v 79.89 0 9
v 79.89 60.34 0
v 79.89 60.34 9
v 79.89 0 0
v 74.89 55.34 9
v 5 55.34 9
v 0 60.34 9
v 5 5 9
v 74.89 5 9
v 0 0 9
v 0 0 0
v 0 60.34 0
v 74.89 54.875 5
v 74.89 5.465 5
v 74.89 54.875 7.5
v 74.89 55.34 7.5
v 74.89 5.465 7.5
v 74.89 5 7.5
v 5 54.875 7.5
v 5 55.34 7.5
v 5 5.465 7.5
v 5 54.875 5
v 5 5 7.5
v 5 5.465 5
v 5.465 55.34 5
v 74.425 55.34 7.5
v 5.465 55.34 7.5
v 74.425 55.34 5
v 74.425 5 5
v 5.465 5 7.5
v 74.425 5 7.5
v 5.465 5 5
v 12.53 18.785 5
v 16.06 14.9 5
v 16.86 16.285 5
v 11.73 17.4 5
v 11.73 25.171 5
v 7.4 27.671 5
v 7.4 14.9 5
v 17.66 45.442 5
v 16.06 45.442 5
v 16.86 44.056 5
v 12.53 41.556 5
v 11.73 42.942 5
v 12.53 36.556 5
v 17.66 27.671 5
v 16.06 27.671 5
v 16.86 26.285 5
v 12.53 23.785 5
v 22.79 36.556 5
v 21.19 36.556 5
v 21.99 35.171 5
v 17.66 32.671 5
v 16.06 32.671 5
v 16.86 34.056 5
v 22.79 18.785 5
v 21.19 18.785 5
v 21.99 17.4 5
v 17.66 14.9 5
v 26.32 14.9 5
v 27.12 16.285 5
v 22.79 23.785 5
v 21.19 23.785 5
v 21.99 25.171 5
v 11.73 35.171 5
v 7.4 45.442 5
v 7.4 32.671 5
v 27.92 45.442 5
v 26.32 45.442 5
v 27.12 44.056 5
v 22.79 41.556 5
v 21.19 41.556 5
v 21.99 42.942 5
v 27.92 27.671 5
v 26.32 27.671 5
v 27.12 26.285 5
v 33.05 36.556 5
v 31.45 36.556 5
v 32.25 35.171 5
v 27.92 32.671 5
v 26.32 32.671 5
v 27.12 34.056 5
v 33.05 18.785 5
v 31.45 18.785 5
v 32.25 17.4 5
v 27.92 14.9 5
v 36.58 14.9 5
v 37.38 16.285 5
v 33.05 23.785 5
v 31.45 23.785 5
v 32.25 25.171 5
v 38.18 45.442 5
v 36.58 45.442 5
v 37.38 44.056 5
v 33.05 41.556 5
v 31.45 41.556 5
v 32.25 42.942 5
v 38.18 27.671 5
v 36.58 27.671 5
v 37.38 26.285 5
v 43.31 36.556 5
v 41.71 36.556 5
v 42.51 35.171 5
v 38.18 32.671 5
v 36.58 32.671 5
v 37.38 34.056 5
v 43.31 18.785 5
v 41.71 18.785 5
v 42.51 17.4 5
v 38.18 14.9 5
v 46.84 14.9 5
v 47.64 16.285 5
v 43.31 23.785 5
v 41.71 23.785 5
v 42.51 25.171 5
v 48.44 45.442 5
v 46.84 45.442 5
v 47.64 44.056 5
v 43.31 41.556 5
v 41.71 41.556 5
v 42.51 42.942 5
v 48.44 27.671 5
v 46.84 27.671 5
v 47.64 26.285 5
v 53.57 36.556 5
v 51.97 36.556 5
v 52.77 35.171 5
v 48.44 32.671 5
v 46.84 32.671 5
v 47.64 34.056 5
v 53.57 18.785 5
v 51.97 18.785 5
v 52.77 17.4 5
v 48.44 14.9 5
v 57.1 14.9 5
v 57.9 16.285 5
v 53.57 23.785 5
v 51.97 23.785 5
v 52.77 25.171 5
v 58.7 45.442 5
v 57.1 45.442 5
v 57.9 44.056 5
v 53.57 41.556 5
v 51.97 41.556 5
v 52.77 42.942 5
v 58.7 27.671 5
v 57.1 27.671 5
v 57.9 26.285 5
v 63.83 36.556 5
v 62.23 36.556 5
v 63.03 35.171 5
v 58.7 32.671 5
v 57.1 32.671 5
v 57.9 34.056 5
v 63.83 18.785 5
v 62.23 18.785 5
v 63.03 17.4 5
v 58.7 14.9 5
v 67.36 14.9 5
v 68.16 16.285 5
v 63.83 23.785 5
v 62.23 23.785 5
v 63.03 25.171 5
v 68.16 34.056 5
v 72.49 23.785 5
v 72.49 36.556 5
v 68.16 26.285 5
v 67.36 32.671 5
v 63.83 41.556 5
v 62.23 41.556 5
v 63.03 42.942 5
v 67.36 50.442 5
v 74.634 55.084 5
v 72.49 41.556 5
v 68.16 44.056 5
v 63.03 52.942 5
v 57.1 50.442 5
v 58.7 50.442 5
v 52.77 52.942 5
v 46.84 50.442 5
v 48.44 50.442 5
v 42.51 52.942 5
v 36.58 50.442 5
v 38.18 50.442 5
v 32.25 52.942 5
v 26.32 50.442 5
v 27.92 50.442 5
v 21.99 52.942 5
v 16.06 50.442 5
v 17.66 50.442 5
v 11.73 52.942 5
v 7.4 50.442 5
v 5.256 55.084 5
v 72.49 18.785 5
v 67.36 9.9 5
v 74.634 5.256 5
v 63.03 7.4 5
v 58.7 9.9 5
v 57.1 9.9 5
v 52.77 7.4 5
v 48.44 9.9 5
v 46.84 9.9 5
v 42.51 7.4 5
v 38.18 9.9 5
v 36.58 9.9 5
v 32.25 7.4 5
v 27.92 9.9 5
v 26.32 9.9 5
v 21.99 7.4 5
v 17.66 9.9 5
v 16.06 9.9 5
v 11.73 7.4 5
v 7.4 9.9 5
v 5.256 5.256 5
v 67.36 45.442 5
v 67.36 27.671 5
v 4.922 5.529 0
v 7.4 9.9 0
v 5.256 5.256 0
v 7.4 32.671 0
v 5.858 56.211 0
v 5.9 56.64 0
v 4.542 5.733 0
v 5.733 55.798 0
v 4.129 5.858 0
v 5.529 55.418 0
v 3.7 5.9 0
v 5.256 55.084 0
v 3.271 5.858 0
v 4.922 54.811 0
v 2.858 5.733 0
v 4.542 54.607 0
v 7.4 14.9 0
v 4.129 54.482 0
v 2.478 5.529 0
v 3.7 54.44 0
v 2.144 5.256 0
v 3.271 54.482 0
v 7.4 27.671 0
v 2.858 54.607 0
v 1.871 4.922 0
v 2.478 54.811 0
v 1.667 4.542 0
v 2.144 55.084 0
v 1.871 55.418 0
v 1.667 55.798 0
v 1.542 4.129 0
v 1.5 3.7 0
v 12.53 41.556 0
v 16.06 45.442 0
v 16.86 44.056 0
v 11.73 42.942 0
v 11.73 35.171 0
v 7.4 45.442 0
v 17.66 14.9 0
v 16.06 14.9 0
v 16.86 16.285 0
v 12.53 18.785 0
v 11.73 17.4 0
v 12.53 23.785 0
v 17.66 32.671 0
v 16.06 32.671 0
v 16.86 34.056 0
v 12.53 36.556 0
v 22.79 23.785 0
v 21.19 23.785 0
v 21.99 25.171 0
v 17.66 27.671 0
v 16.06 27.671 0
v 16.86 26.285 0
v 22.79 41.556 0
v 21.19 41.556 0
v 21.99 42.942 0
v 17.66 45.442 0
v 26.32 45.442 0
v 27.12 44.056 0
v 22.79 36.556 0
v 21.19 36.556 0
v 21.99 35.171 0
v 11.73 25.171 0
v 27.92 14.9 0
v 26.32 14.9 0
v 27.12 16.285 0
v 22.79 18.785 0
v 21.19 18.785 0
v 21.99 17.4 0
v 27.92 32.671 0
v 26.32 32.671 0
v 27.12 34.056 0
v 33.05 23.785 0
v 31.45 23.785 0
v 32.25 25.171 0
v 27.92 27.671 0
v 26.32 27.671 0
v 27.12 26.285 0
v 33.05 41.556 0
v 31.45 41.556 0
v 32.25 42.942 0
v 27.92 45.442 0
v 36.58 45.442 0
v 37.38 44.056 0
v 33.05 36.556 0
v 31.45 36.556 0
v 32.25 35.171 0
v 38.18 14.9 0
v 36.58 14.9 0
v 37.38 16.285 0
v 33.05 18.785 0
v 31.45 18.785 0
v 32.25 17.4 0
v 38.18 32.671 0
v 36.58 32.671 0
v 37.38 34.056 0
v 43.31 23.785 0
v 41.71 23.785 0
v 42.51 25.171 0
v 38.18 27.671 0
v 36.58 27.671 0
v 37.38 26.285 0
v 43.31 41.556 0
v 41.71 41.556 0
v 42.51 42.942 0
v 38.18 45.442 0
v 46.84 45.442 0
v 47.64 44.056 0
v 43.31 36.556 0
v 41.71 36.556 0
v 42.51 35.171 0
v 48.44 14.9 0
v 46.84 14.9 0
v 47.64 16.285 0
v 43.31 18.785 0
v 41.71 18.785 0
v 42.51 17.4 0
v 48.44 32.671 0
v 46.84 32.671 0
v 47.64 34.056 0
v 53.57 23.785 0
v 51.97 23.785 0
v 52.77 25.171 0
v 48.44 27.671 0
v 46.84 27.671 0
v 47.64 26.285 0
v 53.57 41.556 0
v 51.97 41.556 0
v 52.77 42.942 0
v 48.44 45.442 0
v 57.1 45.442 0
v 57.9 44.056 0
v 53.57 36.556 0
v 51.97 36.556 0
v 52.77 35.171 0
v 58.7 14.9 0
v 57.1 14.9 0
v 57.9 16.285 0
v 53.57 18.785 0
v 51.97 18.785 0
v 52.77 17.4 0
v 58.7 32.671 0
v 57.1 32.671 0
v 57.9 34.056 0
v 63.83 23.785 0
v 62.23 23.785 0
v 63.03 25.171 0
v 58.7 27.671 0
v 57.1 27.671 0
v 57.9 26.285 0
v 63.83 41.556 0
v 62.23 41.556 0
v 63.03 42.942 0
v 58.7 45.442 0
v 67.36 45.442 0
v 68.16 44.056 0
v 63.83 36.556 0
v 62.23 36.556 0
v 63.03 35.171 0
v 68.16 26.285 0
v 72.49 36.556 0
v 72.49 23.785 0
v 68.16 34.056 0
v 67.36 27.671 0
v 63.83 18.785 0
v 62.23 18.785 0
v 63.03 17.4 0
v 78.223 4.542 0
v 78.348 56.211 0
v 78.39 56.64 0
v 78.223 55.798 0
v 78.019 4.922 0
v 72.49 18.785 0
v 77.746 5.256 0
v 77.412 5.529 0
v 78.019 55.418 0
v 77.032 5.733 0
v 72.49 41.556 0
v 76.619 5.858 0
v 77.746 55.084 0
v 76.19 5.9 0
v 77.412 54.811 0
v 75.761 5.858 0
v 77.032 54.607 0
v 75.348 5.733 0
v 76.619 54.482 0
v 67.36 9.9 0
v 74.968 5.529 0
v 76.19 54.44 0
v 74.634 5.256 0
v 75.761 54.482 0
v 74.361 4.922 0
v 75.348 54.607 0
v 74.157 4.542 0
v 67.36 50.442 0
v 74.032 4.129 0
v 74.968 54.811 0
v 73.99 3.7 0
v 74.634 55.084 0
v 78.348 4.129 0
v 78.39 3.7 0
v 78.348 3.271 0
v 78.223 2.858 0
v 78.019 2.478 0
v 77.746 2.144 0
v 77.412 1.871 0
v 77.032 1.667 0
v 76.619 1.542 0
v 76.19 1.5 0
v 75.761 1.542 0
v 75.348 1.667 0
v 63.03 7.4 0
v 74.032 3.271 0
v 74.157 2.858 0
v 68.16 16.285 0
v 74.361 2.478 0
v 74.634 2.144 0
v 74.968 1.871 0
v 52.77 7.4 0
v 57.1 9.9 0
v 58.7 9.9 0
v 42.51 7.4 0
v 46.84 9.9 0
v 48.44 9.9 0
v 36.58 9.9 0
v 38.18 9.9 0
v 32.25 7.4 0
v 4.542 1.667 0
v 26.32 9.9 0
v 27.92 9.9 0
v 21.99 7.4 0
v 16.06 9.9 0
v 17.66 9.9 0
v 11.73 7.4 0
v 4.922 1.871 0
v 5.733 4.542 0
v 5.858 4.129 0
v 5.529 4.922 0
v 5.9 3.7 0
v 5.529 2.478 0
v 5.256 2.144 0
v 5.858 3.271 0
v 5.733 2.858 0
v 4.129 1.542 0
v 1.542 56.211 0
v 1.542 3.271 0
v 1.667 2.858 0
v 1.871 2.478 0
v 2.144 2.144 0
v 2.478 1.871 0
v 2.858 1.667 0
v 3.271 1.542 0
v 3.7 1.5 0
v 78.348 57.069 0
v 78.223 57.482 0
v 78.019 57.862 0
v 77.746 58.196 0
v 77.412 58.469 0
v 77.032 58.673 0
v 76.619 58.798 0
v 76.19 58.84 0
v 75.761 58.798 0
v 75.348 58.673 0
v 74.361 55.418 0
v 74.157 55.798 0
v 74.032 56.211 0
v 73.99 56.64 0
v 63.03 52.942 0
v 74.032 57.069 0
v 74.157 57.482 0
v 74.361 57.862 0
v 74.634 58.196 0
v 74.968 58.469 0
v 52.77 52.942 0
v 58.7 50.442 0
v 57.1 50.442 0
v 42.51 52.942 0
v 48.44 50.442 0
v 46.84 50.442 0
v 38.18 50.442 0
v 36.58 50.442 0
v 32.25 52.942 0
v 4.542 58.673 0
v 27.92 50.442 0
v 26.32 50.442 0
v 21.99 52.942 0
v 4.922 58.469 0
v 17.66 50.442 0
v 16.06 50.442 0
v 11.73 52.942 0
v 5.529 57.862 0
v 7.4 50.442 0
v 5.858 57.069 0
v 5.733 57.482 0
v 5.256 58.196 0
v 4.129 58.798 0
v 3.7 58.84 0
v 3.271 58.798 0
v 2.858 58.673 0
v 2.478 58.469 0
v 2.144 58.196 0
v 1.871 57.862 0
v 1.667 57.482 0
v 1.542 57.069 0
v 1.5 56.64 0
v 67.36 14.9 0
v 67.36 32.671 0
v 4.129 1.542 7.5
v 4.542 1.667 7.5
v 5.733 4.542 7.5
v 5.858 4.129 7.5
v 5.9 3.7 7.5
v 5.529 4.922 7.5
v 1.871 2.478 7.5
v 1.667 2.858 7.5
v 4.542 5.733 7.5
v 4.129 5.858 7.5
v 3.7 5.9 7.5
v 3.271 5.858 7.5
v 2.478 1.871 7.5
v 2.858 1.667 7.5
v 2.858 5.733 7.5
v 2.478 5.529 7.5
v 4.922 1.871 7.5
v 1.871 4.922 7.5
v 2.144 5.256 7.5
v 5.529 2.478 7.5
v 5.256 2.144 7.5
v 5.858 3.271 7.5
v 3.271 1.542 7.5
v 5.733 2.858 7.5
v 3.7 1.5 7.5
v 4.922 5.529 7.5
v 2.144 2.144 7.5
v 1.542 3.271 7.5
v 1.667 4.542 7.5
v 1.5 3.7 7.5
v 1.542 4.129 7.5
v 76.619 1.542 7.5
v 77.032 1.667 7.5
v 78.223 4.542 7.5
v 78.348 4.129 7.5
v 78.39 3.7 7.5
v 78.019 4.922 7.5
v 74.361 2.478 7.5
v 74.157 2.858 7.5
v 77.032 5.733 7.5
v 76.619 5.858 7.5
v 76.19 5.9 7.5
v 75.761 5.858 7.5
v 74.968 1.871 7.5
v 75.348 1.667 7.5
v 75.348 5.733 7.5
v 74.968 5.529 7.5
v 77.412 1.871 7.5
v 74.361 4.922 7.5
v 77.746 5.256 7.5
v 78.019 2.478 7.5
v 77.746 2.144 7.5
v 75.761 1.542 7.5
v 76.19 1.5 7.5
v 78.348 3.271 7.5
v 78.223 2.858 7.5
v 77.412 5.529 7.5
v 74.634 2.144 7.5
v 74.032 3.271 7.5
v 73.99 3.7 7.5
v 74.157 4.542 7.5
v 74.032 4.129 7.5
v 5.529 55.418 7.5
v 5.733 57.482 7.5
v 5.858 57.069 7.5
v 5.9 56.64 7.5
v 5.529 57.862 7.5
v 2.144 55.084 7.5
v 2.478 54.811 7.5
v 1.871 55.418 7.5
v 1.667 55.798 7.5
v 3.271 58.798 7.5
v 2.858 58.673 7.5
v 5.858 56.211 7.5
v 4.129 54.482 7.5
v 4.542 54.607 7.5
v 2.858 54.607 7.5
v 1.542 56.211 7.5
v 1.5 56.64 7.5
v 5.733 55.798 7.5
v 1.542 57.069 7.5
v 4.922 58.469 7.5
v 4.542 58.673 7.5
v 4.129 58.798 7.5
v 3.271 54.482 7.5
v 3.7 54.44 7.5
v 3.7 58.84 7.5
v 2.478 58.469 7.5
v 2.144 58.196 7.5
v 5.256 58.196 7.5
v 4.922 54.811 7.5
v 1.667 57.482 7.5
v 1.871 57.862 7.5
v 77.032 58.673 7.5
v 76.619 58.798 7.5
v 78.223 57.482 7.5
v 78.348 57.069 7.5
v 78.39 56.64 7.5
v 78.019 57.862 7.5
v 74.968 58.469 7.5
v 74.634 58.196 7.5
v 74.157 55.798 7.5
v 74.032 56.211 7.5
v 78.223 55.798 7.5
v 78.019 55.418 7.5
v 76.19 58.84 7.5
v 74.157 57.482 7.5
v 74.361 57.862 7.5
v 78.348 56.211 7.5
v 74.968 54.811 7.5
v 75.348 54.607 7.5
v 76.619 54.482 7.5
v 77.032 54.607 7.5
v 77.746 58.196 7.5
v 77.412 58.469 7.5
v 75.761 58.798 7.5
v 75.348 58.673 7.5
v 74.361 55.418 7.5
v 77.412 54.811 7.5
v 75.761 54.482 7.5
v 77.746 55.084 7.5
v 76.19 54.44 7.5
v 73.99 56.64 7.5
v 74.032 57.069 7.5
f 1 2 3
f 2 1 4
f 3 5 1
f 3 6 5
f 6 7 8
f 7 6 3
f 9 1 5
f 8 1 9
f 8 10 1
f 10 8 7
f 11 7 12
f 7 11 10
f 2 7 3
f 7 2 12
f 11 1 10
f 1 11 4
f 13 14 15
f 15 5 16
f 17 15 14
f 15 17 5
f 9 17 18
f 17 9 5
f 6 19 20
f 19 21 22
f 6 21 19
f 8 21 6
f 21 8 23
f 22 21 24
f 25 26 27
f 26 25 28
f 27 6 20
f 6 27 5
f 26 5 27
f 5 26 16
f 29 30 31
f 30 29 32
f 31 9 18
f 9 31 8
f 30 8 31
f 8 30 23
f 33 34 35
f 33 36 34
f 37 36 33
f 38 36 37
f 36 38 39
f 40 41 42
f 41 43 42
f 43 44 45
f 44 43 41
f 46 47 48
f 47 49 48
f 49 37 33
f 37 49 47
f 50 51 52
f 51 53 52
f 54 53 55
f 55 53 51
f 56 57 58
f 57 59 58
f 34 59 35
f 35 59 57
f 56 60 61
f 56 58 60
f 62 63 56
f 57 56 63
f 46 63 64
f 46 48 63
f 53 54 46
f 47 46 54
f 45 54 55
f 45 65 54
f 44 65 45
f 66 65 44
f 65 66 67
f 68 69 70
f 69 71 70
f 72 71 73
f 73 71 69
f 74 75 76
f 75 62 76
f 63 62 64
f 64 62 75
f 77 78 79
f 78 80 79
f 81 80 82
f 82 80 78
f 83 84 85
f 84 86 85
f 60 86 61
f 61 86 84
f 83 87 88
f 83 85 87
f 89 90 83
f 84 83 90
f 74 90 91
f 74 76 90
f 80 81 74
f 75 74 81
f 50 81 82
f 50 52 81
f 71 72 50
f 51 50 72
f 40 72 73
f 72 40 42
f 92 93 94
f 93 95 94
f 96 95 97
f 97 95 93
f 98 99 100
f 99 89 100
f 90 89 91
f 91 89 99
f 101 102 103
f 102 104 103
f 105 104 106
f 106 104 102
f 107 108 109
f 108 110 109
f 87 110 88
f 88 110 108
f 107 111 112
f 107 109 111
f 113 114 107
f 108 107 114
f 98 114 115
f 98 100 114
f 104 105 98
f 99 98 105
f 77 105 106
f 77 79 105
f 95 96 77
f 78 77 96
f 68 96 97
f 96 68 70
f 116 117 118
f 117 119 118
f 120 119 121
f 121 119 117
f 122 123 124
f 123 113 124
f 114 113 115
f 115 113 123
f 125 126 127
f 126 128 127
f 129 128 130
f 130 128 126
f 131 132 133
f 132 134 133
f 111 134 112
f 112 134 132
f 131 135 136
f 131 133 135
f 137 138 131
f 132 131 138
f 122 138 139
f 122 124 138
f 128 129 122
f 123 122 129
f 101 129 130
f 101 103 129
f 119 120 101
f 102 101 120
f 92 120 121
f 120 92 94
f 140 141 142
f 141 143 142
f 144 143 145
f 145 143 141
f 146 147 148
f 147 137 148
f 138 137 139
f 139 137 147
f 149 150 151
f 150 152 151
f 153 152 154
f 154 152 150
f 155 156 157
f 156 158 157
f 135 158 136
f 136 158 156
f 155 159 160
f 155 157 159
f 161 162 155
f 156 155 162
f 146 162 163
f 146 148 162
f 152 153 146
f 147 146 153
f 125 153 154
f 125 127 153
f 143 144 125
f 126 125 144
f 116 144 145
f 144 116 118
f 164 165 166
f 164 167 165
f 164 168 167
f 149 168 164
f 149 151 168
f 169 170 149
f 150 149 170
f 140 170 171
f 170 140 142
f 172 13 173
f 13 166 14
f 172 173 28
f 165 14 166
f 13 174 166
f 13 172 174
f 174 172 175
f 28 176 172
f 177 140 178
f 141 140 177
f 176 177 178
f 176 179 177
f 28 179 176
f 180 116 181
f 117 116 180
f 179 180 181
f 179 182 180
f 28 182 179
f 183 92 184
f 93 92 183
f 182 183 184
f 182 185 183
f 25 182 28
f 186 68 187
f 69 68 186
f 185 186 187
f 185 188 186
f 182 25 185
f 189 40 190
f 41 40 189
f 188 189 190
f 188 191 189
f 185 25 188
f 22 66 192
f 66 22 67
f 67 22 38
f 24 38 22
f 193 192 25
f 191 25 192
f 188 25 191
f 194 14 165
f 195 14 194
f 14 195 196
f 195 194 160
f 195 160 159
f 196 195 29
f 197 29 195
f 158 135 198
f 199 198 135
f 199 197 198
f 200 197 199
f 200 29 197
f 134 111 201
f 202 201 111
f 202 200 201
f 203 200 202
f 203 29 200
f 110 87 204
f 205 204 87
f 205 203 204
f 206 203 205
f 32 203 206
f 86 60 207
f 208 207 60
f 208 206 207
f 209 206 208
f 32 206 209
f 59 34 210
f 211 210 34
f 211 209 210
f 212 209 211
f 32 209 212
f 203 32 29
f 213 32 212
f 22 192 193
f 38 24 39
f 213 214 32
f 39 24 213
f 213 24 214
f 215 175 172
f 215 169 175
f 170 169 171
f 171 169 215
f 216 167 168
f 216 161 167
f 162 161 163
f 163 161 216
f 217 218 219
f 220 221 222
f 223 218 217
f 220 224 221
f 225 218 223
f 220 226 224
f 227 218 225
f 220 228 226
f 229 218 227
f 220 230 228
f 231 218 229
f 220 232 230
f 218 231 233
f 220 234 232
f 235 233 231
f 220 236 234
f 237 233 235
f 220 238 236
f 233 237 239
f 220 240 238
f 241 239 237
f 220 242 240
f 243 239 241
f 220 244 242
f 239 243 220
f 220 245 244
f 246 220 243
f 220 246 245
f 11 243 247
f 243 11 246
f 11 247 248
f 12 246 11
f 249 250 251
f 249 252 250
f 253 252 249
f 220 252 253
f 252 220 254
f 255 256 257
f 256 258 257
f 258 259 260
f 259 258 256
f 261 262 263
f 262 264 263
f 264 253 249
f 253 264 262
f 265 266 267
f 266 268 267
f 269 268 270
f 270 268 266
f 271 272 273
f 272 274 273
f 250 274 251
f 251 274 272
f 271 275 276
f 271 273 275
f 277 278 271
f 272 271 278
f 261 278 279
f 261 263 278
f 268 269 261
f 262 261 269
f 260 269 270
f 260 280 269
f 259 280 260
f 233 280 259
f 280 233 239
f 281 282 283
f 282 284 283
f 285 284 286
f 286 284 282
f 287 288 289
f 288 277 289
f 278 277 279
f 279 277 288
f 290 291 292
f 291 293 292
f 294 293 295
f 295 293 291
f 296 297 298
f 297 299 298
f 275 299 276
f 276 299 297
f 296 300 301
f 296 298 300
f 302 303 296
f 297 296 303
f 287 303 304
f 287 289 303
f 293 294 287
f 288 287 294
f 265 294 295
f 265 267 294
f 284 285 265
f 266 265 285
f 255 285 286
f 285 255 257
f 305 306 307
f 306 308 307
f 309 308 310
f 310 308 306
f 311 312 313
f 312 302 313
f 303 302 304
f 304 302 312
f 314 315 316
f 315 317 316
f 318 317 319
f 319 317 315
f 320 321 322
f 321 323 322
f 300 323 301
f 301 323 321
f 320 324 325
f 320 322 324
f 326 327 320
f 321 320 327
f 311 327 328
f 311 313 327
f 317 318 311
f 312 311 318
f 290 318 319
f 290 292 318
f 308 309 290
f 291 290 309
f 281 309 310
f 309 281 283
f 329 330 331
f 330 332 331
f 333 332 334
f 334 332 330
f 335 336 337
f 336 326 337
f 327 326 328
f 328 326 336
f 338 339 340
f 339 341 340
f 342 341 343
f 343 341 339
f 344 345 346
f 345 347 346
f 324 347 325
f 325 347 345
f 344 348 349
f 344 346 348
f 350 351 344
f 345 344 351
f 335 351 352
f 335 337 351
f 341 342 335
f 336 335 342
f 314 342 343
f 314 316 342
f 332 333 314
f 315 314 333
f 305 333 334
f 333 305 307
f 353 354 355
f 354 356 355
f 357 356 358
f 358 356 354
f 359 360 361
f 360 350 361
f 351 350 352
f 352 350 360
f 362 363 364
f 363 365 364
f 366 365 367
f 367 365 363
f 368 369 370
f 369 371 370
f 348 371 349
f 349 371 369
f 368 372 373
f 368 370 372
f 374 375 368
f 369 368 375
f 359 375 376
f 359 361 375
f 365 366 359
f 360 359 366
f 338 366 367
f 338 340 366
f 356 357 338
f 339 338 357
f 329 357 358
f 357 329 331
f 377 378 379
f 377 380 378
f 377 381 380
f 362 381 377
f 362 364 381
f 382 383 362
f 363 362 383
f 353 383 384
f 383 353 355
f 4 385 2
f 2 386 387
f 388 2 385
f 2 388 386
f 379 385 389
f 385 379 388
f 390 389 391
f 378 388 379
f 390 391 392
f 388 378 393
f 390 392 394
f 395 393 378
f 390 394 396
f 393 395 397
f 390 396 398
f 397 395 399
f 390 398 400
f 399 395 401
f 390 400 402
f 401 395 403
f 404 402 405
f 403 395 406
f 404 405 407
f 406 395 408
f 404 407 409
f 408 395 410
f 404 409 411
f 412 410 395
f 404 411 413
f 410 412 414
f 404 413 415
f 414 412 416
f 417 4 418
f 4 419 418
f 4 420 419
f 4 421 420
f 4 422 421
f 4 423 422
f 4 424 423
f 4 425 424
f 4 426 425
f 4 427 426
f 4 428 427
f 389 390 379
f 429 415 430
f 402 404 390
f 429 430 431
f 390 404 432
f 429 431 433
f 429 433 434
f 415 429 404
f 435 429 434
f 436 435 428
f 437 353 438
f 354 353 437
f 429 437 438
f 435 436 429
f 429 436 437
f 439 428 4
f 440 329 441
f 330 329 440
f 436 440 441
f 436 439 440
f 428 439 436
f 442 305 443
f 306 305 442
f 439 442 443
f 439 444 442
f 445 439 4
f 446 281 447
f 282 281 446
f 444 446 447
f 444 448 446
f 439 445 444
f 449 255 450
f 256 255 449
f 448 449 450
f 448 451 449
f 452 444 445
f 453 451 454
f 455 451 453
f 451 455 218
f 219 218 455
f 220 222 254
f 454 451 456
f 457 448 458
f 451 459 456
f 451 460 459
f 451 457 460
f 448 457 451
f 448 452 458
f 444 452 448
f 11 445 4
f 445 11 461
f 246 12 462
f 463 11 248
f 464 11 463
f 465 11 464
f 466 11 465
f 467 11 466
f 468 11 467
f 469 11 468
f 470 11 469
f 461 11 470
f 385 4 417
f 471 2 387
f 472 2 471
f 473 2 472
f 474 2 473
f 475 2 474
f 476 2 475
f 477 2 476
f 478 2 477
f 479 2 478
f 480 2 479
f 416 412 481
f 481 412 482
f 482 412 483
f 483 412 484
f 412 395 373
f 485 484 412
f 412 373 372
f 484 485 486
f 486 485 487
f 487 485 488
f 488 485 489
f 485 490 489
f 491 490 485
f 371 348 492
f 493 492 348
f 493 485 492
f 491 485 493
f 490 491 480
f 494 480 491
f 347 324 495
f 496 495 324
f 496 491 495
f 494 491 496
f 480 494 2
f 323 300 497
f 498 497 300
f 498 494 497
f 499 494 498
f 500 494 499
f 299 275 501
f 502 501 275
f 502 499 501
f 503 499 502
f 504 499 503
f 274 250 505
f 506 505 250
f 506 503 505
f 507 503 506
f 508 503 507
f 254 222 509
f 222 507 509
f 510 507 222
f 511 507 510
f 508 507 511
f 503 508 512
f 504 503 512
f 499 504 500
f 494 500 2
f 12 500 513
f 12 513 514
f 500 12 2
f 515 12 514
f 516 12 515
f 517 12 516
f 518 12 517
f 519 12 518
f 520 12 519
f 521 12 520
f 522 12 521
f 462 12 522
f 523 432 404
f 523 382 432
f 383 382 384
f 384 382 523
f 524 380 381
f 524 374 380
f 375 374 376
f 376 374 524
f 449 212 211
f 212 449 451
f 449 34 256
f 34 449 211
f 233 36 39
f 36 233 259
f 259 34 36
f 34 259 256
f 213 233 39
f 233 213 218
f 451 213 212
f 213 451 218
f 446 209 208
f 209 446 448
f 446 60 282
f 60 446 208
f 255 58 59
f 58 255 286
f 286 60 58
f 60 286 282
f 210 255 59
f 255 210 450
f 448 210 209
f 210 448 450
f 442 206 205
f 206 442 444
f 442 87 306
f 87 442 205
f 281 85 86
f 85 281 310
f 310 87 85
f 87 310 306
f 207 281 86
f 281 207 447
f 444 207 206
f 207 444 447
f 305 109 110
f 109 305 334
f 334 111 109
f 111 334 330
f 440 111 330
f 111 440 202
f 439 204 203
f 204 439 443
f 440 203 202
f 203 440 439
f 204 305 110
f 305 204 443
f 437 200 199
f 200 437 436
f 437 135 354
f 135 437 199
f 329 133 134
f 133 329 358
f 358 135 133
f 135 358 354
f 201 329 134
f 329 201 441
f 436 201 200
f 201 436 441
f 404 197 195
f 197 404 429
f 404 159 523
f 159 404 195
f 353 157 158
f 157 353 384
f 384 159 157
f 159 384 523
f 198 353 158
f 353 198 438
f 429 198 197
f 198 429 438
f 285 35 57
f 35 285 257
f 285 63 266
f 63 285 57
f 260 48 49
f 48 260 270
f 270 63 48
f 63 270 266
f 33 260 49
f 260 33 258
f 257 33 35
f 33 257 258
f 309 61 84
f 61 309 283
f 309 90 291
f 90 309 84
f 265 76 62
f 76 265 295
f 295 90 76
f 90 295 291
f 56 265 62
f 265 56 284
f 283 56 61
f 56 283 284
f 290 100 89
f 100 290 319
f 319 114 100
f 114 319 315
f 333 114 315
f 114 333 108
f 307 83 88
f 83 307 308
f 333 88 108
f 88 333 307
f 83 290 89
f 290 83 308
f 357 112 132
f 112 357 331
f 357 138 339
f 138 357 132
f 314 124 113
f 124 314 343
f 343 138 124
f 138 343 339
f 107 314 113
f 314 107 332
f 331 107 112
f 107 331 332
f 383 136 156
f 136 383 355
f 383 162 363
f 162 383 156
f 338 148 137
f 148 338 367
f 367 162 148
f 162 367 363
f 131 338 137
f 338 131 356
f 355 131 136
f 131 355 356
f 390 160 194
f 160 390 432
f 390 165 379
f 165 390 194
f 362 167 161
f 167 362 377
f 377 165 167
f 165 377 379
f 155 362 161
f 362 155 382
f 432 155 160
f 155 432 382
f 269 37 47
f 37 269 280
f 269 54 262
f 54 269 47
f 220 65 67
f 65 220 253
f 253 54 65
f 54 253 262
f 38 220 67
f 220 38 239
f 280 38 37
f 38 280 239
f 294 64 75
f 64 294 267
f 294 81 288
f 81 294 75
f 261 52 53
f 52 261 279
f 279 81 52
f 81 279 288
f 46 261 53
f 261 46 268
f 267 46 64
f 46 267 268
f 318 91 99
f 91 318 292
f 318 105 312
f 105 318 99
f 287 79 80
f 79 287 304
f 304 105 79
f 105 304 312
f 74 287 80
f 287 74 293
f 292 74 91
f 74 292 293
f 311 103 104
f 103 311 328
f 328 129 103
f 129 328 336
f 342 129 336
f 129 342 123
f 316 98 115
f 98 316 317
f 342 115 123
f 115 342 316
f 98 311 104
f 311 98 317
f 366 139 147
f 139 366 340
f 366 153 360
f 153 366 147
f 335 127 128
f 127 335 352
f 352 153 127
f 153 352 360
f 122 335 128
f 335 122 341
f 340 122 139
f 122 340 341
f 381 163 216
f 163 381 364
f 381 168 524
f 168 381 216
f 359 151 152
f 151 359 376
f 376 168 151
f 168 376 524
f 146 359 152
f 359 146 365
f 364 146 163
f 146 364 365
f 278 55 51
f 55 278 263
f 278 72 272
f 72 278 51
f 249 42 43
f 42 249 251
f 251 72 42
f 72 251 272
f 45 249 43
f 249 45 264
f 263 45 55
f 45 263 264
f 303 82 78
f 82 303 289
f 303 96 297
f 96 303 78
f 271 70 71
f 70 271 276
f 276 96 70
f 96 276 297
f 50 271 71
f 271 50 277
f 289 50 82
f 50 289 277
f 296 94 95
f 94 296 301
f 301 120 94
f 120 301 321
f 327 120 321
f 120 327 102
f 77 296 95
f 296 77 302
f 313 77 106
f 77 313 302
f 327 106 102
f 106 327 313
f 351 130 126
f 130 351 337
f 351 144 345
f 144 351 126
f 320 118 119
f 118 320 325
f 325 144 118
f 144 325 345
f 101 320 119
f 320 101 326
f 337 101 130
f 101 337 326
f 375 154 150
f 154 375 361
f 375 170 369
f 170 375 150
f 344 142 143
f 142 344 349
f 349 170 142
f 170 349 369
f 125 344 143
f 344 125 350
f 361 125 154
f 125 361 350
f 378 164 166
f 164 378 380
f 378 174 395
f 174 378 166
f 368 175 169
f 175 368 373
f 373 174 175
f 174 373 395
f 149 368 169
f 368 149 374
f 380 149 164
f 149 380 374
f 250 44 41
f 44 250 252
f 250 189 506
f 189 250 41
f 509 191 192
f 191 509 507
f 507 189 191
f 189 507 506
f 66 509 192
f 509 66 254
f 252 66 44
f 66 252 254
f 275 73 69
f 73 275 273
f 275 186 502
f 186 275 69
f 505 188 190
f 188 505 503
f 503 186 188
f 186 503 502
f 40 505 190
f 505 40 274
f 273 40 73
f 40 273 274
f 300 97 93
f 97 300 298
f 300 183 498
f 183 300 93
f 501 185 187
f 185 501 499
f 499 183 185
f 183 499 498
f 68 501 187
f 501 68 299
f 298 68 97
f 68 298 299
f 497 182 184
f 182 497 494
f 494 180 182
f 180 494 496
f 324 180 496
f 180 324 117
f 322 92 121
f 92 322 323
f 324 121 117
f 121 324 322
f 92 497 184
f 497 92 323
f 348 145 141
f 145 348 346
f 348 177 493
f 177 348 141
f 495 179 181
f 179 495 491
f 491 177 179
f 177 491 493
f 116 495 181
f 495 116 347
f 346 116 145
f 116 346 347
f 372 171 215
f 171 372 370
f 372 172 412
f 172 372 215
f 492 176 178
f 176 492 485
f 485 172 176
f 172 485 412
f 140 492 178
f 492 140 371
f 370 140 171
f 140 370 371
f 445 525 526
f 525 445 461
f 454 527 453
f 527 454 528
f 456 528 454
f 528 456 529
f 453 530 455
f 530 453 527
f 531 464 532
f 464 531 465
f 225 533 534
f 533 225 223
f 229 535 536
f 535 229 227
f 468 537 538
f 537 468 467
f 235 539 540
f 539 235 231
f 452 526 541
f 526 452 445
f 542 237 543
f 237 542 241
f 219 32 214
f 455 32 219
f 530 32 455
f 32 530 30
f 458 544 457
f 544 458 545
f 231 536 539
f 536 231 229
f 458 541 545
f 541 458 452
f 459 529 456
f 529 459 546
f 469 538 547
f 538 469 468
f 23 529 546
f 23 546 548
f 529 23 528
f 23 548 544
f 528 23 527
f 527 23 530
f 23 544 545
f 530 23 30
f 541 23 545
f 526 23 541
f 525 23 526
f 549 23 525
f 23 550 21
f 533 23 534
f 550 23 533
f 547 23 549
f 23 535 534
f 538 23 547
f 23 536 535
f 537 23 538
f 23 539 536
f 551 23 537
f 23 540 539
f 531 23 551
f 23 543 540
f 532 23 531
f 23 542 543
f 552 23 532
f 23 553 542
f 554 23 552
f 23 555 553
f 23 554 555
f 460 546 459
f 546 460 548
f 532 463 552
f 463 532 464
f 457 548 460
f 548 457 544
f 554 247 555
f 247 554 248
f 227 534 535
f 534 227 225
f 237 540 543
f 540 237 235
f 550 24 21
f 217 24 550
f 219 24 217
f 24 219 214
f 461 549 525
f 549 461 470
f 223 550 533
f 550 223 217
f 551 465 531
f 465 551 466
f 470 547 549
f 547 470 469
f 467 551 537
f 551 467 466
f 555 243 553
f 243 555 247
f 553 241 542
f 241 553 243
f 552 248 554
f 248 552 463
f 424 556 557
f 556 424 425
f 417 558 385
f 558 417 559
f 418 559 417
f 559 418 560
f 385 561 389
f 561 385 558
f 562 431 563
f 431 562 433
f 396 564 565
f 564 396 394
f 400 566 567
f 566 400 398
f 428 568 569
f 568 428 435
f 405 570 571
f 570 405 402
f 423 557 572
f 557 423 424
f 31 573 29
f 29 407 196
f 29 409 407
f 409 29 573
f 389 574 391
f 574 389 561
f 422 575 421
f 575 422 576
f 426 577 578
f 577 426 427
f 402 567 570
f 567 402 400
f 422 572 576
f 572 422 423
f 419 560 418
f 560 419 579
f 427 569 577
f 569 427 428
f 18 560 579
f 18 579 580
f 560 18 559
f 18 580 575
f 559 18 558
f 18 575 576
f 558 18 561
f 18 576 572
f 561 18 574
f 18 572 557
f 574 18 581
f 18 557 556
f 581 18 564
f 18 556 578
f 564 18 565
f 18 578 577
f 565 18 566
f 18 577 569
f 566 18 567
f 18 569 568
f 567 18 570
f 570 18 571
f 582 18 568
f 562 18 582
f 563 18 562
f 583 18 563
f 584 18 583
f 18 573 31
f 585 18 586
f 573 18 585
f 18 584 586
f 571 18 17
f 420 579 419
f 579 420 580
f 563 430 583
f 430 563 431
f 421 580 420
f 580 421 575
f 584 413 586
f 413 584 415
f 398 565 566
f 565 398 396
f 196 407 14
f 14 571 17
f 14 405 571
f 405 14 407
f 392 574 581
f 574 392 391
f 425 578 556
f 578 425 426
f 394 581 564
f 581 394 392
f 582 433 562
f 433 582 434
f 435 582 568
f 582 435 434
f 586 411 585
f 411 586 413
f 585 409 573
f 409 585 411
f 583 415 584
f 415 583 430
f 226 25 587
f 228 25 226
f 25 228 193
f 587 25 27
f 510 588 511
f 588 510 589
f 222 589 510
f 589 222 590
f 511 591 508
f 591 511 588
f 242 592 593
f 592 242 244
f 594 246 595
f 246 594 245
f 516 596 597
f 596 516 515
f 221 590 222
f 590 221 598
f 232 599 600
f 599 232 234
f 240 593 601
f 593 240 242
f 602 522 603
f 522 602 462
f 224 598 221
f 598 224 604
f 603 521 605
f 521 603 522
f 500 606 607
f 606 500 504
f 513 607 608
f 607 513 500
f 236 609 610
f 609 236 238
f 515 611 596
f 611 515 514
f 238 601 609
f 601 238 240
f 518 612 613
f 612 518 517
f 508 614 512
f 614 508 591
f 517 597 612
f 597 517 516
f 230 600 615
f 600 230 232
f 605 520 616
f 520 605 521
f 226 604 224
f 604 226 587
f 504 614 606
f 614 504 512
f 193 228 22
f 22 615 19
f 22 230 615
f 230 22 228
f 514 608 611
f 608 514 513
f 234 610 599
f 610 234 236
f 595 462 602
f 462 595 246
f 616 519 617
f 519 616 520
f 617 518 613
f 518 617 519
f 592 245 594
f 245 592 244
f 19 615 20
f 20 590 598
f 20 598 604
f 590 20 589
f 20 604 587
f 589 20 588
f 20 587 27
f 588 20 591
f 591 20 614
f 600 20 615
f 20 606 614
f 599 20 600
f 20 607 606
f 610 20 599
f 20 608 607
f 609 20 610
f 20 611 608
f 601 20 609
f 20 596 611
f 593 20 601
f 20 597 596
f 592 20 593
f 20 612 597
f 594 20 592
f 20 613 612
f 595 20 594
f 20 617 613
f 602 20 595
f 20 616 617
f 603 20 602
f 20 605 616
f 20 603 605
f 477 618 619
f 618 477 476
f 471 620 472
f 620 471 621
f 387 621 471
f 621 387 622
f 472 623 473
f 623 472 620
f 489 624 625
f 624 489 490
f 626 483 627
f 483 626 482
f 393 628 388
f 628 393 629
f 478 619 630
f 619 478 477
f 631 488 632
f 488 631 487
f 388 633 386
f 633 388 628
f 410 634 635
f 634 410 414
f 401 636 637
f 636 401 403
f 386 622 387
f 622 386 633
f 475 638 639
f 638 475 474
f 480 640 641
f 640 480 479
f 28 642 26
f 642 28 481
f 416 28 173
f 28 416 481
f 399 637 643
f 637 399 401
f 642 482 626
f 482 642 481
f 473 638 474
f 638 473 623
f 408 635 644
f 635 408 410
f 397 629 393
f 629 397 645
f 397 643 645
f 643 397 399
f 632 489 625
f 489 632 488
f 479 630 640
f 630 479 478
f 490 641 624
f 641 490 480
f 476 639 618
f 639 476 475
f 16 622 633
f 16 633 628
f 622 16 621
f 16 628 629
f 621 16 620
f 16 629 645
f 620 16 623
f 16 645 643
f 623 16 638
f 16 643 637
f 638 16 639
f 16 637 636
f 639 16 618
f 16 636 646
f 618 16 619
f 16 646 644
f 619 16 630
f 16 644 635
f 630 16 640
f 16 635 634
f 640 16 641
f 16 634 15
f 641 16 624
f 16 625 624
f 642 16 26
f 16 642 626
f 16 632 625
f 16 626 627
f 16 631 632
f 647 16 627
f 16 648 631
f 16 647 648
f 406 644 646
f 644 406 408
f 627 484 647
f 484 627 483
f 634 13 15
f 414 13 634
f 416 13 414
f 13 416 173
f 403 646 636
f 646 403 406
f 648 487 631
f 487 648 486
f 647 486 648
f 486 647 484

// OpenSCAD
$fn = 32;

// ----------------------------------------------------------------------
// Honeycomb panel: 79.89 x 60.34 mm, 30 cells of 10 mm
// ----------------------------------------------------------------------

// --- parameters (mm) ---
panel_w = 79.89;          // panel width
panel_d = 60.34;          // panel depth
thick = 5;                // panel thickness
cell_r = 5;               // hex cell circumradius
pitch = 10.26;            // hex cell pitch (centre to centre)
web = 1.6;                // web between the cells
columns = 6;              // columns of cells
rows = 5;                 // rows of cells
cell_count = 30;          // total cells
shift_x = 11.73;          // first cell offset in x
shift_y = 12.4;           // first cell offset in y
mount_d = 4.4;            // corner mounting holes
hole_off = 3.7;           // mounting hole offset from the corners
rim_h = 9;                // rim height
rim_t = 5;                // rim wall thickness

difference() {
  union() {
    cube([panel_w, panel_d, thick]);
    /* rim around the panel, sunk 1 mm into the plate */
    translate([0, 0, thick - 1]) difference() {
      cube([panel_w, panel_d, rim_h - thick + 1]);
      translate([rim_t, rim_t, -2.5]) cube([panel_w - 2 * rim_t, panel_d - 2 * rim_t, rim_h - thick + 6]);
    }
  }
  /* hexagonal cells, point-up, cut right through the plate */
  for (row = [0 : rows - 1]) {
    for (col = [0 : columns - 1]) {
      translate([shift_x + col * pitch + (row % 2) * pitch / 2, shift_y + row * pitch * 0.866025, -2.5]) rotate([0, 0, 30]) cylinder(h = thick + 5, d = 2 * cell_r, $fn = 6);
    }
  }
  /* corner mounting holes, clear of the outer cell web */
  translate([3.7, 3.7, -2.5]) cylinder(h = thick + 5, d = mount_d);
  translate([76.19, 3.7, -2.5]) cylinder(h = thick + 5, d = mount_d);
  translate([3.7, 56.64, -2.5]) cylinder(h = thick + 5, d = mount_d);
  translate([76.19, 56.64, -2.5]) cylinder(h = thick + 5, d = mount_d);
}
